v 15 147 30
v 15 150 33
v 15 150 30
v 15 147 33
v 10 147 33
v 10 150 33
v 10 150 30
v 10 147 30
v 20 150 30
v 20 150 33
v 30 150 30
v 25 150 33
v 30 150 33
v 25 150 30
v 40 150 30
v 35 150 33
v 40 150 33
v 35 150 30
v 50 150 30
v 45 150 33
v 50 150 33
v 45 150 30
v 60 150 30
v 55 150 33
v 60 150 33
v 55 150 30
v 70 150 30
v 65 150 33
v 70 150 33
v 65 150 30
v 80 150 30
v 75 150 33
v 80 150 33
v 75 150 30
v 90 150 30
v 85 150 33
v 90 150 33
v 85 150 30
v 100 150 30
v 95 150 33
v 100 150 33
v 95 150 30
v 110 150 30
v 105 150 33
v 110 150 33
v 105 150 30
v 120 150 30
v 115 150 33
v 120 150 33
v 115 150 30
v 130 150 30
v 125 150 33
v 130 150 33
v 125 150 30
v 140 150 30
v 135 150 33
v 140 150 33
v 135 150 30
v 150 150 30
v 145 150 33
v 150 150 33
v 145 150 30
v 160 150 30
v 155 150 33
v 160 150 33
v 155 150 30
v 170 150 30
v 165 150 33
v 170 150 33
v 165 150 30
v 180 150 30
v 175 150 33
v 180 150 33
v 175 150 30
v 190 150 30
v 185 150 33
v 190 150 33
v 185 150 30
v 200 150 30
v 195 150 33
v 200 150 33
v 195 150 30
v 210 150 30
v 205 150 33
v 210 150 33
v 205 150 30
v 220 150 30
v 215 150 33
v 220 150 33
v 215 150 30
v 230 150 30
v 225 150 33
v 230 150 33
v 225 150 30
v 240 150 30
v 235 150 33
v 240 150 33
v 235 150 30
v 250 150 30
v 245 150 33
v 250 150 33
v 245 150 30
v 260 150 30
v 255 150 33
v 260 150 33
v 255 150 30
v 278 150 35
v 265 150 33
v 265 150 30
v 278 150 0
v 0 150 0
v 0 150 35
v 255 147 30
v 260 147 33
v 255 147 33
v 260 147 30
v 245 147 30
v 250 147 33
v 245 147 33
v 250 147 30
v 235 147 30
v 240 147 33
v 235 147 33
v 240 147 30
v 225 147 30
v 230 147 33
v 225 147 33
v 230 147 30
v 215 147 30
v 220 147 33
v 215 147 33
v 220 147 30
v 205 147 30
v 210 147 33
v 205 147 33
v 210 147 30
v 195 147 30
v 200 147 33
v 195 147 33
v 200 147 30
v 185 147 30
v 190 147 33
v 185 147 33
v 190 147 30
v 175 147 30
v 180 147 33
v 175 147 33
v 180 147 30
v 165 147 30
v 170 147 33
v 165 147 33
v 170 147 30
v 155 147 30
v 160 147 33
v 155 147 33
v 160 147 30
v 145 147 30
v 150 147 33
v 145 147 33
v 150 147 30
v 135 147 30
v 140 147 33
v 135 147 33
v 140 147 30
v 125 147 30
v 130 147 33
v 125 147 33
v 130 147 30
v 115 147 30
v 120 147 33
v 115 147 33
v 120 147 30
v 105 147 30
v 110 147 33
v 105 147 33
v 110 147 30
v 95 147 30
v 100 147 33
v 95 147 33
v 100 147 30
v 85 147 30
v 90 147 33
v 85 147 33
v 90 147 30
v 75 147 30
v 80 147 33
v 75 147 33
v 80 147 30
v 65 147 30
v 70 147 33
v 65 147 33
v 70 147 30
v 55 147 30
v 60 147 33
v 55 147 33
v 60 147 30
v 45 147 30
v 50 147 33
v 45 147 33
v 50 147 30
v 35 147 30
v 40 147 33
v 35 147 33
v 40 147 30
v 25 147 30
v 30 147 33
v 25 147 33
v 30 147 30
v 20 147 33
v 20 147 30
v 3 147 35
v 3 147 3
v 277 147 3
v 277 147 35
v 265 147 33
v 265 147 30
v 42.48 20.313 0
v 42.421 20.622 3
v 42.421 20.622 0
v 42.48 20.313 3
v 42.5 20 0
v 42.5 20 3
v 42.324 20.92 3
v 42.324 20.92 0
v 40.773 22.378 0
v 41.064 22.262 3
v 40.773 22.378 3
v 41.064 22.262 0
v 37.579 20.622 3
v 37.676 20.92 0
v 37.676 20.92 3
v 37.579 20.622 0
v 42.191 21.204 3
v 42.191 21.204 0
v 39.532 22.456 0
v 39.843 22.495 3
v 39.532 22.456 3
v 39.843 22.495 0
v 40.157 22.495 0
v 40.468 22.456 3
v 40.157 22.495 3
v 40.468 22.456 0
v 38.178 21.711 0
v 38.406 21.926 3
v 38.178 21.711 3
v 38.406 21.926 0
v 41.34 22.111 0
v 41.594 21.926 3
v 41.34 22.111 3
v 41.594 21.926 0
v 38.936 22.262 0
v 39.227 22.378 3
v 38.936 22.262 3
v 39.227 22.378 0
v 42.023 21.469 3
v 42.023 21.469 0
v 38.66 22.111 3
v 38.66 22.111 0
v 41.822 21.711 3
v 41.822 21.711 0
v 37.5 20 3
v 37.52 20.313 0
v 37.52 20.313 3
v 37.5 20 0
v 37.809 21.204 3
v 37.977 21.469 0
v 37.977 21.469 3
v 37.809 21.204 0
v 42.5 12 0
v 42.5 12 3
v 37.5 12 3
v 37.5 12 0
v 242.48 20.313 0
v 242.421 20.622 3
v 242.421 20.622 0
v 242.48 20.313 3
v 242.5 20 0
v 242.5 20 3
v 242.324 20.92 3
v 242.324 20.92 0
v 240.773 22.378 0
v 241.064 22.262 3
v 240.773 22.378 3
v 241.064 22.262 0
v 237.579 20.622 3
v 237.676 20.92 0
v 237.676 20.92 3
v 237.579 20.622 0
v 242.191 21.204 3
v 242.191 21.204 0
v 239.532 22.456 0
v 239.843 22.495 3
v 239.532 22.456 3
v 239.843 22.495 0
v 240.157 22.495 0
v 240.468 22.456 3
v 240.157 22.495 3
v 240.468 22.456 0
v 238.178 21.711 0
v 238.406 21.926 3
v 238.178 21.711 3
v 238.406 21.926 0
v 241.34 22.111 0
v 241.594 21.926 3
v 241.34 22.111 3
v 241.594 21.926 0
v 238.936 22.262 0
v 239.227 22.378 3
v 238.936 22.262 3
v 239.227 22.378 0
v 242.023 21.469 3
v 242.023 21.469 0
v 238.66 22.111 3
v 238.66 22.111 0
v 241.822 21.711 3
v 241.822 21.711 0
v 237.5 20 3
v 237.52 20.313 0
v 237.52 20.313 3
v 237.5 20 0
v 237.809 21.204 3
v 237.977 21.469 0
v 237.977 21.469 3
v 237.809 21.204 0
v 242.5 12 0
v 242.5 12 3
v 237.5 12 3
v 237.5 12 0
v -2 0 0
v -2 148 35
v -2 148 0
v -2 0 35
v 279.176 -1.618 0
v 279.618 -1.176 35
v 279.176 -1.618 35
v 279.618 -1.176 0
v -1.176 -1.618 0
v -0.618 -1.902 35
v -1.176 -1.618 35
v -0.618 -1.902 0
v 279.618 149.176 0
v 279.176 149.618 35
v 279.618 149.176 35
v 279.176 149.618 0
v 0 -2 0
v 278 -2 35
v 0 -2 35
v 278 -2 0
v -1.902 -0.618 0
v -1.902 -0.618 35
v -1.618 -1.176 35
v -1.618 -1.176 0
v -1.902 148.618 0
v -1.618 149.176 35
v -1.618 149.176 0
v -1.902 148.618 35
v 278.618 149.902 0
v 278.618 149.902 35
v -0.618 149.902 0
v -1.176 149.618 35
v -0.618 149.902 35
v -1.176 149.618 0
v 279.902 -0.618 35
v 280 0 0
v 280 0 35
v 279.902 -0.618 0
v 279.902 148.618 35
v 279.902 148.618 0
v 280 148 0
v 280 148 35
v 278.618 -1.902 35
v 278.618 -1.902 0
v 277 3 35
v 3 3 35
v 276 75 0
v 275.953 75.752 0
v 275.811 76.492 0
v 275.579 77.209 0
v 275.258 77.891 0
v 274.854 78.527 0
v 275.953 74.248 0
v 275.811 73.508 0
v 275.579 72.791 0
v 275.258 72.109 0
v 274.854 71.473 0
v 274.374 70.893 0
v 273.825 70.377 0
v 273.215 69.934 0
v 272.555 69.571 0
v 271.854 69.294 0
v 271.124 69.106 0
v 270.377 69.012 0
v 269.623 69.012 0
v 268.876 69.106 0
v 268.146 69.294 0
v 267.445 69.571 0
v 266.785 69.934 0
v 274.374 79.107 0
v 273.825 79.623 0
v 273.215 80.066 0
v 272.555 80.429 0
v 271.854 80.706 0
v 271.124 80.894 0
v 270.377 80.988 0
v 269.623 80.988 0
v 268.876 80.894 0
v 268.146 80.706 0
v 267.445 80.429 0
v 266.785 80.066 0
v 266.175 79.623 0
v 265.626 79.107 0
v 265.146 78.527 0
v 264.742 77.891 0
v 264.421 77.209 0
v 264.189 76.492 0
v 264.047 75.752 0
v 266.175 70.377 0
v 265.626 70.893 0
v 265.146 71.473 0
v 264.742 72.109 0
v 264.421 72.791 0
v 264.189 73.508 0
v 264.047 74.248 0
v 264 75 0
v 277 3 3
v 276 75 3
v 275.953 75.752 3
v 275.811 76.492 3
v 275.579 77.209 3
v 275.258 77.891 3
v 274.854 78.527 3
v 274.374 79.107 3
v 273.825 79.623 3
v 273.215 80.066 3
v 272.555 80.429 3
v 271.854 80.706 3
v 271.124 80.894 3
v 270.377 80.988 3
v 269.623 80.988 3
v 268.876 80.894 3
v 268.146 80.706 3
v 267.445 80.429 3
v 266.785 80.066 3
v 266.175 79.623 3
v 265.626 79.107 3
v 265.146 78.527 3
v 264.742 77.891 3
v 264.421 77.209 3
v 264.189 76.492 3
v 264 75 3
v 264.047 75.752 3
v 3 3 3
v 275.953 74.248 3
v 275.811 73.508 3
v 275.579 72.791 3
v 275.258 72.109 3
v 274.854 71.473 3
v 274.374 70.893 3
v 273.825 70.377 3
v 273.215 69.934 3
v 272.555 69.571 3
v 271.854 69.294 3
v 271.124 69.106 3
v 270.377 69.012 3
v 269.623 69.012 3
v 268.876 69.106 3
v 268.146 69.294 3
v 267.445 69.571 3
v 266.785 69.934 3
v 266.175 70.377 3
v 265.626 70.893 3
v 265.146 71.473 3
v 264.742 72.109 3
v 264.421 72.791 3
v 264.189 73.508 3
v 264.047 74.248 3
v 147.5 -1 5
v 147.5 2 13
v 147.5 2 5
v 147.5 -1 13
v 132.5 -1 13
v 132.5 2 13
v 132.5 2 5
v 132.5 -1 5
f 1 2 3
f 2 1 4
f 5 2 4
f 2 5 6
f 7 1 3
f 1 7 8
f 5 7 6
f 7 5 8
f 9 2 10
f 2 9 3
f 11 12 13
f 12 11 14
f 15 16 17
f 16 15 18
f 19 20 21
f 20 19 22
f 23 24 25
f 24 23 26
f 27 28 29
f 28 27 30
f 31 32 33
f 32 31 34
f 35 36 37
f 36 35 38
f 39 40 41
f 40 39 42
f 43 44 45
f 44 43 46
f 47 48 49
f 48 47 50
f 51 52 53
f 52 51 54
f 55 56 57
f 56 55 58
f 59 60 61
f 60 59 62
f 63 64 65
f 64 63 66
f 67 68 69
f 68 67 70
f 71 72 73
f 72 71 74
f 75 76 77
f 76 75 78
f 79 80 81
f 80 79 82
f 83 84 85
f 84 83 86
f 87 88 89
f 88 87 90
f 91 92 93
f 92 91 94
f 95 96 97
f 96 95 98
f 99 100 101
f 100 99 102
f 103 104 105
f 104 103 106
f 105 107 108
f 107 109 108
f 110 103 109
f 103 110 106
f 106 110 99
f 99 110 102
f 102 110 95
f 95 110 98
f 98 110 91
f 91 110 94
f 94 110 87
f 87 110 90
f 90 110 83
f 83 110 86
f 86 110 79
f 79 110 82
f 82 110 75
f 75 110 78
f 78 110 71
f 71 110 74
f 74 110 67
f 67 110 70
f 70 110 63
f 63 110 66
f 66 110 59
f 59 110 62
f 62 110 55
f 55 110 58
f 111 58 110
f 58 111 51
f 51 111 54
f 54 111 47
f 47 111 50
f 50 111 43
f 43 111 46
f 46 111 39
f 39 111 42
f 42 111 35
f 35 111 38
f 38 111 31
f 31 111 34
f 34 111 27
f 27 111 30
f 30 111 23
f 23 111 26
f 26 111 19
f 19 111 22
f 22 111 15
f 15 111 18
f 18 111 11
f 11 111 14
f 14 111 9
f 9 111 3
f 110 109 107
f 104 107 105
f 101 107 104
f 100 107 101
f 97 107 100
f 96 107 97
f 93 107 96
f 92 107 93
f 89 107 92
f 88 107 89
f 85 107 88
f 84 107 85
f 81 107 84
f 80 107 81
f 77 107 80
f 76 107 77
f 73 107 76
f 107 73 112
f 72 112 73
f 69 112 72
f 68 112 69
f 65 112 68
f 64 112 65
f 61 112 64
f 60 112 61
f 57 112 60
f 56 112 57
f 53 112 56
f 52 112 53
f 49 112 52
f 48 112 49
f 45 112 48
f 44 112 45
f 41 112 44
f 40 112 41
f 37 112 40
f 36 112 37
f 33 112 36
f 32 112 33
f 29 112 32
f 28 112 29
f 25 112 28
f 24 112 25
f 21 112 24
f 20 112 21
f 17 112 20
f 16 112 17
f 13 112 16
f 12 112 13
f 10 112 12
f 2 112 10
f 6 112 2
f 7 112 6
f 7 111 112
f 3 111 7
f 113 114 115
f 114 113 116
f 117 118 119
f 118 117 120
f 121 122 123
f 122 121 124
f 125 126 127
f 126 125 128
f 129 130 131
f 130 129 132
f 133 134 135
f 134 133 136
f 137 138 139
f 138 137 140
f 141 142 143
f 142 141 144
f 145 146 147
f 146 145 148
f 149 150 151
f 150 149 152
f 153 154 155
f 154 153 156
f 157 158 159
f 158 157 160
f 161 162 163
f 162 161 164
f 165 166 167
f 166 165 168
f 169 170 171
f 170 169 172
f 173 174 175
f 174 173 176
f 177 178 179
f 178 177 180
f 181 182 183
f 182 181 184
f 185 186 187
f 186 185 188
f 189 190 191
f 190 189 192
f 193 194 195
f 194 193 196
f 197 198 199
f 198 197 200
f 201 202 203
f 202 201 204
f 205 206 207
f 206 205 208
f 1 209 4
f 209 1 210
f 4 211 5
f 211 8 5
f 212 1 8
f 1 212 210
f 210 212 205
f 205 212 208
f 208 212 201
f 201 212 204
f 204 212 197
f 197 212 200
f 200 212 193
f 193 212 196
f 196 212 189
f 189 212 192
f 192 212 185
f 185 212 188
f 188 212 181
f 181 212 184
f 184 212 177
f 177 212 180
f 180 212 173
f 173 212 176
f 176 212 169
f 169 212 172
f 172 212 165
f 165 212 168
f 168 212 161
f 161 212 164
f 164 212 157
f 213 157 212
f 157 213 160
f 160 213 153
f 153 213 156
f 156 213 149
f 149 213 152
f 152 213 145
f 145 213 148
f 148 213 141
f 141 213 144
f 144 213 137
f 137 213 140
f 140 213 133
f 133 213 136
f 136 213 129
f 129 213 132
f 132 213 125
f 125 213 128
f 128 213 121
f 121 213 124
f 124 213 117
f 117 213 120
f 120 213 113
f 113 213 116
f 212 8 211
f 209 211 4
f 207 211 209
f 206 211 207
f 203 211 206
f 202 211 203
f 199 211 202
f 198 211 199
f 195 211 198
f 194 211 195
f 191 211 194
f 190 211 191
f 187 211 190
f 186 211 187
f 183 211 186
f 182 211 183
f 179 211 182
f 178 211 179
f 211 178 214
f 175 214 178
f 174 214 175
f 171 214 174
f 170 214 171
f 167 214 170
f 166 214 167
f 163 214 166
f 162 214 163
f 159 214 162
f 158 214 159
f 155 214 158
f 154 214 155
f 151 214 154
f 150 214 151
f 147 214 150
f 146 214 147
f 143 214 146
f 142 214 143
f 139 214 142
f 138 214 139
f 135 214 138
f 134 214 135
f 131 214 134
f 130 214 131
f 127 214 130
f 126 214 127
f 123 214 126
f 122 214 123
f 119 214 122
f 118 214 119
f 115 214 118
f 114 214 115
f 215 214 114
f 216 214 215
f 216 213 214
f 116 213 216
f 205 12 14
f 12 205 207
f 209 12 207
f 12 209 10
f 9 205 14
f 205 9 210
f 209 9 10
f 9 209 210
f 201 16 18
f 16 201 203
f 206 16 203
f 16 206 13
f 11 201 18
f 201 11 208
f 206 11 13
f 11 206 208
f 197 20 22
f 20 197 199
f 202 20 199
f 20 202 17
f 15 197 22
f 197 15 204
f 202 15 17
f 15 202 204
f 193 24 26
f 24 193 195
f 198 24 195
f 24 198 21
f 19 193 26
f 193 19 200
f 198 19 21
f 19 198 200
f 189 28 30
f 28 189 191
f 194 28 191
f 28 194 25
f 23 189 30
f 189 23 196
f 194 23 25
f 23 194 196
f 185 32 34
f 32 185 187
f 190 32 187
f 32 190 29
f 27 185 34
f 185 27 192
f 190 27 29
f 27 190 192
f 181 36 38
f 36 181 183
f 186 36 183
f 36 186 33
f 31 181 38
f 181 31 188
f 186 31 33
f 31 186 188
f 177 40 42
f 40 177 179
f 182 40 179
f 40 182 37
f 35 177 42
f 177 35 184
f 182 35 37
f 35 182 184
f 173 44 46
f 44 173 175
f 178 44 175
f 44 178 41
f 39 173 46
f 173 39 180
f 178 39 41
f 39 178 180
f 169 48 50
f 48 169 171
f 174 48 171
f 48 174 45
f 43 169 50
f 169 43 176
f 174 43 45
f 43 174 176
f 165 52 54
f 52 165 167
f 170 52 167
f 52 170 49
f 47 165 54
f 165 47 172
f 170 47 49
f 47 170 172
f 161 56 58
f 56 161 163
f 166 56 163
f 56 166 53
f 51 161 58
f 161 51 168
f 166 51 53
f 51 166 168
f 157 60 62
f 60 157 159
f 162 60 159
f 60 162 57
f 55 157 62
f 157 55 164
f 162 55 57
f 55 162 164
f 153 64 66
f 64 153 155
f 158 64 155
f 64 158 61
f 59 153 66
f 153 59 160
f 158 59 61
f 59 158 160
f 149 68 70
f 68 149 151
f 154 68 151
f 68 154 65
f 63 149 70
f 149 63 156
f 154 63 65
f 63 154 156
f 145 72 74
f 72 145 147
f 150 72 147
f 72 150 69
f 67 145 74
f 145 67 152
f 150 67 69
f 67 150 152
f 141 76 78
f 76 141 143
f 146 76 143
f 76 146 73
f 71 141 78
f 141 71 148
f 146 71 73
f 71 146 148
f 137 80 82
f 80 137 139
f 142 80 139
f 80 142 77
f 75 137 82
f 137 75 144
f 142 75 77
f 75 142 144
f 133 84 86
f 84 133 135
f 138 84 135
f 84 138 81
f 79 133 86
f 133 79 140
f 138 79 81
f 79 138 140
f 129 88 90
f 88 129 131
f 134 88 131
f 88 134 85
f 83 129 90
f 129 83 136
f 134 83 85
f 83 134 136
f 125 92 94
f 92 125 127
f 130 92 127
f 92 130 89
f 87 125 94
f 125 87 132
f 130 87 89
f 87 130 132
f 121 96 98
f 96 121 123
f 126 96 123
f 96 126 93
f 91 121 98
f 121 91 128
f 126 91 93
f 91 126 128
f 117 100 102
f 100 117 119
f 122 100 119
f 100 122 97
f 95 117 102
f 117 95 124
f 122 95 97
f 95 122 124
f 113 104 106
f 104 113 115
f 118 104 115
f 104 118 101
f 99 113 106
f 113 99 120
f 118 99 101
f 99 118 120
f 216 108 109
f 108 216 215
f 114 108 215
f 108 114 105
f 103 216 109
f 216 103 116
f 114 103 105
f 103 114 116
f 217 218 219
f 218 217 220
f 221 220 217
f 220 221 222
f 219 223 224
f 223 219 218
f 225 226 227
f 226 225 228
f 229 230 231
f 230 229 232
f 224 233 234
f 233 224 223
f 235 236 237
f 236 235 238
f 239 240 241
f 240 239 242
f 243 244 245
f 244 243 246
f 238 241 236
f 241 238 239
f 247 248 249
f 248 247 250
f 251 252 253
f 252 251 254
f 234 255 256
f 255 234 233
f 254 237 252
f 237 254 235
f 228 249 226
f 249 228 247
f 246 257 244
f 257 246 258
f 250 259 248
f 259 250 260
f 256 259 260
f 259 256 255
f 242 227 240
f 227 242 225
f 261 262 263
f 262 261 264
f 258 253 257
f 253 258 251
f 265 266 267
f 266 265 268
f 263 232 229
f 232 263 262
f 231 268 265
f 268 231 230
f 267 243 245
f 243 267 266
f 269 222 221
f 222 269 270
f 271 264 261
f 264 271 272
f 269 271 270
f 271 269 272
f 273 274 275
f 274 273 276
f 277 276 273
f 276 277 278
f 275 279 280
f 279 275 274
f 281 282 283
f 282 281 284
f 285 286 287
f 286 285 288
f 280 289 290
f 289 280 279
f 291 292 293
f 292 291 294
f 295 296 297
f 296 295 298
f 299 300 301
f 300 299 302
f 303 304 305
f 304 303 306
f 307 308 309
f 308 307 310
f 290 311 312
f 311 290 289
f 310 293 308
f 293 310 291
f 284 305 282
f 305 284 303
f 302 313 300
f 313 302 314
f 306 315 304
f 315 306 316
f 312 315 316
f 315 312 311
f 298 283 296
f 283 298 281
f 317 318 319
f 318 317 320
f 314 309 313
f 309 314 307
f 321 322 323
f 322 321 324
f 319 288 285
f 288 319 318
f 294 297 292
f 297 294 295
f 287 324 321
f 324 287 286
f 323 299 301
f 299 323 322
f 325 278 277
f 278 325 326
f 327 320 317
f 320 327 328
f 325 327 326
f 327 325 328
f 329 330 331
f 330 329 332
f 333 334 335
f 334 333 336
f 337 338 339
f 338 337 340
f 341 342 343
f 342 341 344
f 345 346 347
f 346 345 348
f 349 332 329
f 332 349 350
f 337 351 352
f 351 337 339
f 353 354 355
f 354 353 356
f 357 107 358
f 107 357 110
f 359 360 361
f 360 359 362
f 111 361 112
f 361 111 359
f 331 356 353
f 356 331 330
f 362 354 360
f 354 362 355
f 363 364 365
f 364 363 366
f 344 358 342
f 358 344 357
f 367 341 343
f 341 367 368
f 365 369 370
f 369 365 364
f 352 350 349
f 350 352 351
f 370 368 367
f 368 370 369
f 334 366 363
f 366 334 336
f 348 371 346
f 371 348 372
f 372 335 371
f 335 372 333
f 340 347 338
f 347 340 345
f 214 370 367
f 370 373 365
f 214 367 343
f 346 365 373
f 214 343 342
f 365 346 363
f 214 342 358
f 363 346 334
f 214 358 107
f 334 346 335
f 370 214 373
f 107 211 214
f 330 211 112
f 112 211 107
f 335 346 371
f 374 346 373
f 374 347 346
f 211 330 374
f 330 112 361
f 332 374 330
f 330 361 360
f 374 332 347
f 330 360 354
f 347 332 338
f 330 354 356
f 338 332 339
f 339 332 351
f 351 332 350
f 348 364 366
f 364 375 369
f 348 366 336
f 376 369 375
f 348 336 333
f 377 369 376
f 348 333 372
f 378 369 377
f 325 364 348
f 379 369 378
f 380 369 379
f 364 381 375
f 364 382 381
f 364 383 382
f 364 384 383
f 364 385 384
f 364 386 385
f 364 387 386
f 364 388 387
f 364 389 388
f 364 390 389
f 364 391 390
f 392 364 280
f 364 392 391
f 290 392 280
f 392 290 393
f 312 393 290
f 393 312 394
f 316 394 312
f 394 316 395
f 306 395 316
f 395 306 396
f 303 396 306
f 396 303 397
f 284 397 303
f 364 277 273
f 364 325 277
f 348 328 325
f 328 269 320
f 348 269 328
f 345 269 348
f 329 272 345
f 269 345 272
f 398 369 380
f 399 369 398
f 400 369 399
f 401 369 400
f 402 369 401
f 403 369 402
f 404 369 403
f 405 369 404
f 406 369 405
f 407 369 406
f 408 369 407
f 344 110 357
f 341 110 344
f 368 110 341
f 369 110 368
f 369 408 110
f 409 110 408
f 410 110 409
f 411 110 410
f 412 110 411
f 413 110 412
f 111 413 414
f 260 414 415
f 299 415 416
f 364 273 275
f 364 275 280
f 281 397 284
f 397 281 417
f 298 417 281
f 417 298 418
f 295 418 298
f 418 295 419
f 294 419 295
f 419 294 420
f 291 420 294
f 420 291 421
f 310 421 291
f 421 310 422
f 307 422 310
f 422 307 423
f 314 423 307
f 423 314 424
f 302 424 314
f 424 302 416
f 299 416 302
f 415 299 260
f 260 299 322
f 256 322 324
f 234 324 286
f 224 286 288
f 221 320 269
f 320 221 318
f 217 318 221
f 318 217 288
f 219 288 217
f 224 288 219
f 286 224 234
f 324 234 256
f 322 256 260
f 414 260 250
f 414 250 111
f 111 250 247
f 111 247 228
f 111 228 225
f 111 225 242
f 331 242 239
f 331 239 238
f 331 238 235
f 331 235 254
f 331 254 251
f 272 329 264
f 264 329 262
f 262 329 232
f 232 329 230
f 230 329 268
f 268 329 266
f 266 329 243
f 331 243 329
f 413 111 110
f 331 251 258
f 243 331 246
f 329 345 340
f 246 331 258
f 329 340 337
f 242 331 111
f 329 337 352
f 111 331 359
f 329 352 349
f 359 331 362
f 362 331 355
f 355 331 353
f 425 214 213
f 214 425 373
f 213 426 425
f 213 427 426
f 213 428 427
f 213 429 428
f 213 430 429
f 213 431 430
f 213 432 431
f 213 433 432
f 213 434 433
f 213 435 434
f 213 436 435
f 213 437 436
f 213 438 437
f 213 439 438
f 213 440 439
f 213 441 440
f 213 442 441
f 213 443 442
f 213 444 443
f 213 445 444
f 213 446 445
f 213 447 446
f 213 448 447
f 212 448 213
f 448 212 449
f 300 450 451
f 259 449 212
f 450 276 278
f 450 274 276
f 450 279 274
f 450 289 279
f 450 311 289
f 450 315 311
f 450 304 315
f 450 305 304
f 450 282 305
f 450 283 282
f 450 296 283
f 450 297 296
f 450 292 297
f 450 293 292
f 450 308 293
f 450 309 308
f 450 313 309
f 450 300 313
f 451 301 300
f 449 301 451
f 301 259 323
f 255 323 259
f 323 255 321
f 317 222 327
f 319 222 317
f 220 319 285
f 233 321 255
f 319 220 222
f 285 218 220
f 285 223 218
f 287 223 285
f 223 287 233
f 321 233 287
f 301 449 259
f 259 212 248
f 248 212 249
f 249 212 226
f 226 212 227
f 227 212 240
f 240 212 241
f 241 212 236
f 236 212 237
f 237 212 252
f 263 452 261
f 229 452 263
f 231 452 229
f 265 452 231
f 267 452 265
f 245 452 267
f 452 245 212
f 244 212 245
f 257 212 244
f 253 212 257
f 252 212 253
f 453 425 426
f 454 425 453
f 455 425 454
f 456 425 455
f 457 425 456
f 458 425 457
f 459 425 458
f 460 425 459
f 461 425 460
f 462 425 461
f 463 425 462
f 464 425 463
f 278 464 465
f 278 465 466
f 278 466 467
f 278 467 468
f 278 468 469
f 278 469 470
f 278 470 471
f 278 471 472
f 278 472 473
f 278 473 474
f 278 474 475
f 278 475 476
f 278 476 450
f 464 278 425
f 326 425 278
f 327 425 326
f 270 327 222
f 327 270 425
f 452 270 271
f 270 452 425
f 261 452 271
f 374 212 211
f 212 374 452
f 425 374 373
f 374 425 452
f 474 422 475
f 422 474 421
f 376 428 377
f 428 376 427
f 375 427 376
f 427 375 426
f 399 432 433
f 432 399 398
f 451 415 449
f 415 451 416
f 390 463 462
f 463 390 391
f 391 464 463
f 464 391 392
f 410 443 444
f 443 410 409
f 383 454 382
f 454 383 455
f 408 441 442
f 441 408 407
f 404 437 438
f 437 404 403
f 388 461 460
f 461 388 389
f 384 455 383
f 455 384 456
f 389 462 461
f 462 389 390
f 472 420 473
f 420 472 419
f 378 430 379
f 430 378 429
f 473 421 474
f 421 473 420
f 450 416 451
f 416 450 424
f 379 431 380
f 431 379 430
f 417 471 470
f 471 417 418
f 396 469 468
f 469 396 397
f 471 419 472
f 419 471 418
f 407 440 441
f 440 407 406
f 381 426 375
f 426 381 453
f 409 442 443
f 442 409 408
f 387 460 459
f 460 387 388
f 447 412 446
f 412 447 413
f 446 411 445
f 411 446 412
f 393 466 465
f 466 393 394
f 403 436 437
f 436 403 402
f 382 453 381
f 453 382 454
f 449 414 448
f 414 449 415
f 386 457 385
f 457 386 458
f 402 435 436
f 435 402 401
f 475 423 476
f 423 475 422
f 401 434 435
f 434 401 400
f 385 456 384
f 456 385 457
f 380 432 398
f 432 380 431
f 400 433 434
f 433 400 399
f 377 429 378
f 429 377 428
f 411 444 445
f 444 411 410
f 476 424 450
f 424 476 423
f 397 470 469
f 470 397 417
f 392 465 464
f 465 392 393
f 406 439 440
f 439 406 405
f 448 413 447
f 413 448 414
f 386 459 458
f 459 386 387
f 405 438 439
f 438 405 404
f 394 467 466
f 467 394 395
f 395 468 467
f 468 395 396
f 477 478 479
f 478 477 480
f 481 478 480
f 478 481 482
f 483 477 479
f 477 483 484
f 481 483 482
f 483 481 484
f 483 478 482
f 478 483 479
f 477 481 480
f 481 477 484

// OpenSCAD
// Wall-mountable case for 64x32 RGB LED Matrix with Raspberry Pi 4 + Bonnet

// ==================== Configuration Variables ====================
// Main case dimensions
case_width = 280;     // Overall width
case_height = 150;    // Overall height
case_depth = 35;      // Overall depth

// LED matrix dimensions
matrix_width = 256;
matrix_height = 128;
matrix_depth = 12;

// Raspberry Pi 4 + Bonnet dimensions
pi_width = 85;
pi_height = 56;
pi_depth = 18;
pi_mount_x_offset = 10; // Offset from left wall
pi_mount_y_offset = 10; // Offset from bottom

// Speaker cutout
speaker_width = 40;
speaker_height = 15;
speaker_offset_x = 10;  // Distance from left edge
speaker_offset_y = (case_height - speaker_height) / 2;

// Button cutout
button_diameter = 12;
button_offset_x = case_width - 10; // Distance from right edge
button_offset_y = case_height / 2; // Centered vertically

// Keyhole mounting slots
keyhole_spacing = 200;
keyhole_diameter = 5;   // Hole for #8 screw
keyhole_slot_length = 8;
keyhole_offset_y = 20;  // Distance from top

// Cable entry hole
cable_width = 15;
cable_height = 8;
cable_offset_x = (case_width - cable_width) / 2;
cable_offset_y = 5;

// Ventilation slots
vent_width = 5;
vent_spacing = 5;
num_vents = floor((case_width - 20) / (vent_width + vent_spacing));

// ==================== Main Assembly ====================
module case_body() {
    difference() {
        // Main body
        rounded_cube([case_width, case_height, case_depth], radius=2);

        // Hollow out inside (leave 3mm wall thickness)
        translate([3, 3, 3]) 
            cube([case_width - 6, case_height - 6, case_depth - 3]);

        // LED matrix cutout
        translate([(case_width - matrix_width) / 2, 
                   (case_height - matrix_height) / 2, 
                   3]) 
            cube([matrix_width, matrix_height, matrix_depth]);

        // Speaker grill
        translate([speaker_offset_x, speaker_offset_y, 3])
            cube([speaker_width, speaker_height, case_depth]);

        // Button cutout
        translate([button_offset_x, button_offset_y, -1])
            cylinder(h=case_depth + 2, d=button_diameter, $fn=50);

        // Cable entry
        translate([cable_offset_x, -1, cable_offset_y])
            cube([cable_width, 3, cable_height]);

        // Ventilation slots
        for (i = [0:num_vents - 1]) {
            translate([10 + i * (vent_width + vent_spacing), case_height - 3, case_depth - 5])
                cube([vent_width, 3, 3]);
        }

        // Keyhole mounting slots
        keyhole_mounting_slots();
    }
}

// ==================== Modules ====================

// Rounded cube module for smoother edges
module rounded_cube(size, radius) {
    hull() {
        for (x = [0, size.x - radius], y = [0, size.y - radius])
            translate([x, y, 0]) cylinder(h = size.z, r = radius, $fn=20);
    }
}

// Keyhole mounting slots
module keyhole_mounting_slots() {
    for (x = [(case_width - keyhole_spacing) / 2, (case_width + keyhole_spacing) / 2]) {
        translate([x, keyhole_offset_y, -1]) {
            // Circular hole
            cylinder(h = case_depth + 2, d = keyhole_diameter, $fn=50);
            // Slot extension
            translate([-keyhole_diameter/2, -keyhole_slot_length, 0])
                cube([keyhole_diameter, keyhole_slot_length, case_depth + 2]);
        }
    }
}

// Mounting posts for Raspberry Pi
module pi_mounting_posts() {
    post_radius = 3;
    post_height = 10;
    hole_diameter = 2.5;
    hole_depth = 8;

    for (offset = [
        [0, 0],
        [pi_width, 0],
        [0, pi_height],
        [pi_width, pi_height]
    ]) {
        translate([pi_mount_x_offset + offset[0], pi_mount_y_offset + offset[1], 3])
            difference() {
                cylinder(h = post_height, r = post_radius, $fn=20);
                translate([0, 0, -1])
                    cylinder(h = hole_depth, d = hole_diameter, $fn=30);
            }
    }
}

// ==================== Assemble the Case ====================
difference() {
    case_body();
    pi_mounting_posts();
}
